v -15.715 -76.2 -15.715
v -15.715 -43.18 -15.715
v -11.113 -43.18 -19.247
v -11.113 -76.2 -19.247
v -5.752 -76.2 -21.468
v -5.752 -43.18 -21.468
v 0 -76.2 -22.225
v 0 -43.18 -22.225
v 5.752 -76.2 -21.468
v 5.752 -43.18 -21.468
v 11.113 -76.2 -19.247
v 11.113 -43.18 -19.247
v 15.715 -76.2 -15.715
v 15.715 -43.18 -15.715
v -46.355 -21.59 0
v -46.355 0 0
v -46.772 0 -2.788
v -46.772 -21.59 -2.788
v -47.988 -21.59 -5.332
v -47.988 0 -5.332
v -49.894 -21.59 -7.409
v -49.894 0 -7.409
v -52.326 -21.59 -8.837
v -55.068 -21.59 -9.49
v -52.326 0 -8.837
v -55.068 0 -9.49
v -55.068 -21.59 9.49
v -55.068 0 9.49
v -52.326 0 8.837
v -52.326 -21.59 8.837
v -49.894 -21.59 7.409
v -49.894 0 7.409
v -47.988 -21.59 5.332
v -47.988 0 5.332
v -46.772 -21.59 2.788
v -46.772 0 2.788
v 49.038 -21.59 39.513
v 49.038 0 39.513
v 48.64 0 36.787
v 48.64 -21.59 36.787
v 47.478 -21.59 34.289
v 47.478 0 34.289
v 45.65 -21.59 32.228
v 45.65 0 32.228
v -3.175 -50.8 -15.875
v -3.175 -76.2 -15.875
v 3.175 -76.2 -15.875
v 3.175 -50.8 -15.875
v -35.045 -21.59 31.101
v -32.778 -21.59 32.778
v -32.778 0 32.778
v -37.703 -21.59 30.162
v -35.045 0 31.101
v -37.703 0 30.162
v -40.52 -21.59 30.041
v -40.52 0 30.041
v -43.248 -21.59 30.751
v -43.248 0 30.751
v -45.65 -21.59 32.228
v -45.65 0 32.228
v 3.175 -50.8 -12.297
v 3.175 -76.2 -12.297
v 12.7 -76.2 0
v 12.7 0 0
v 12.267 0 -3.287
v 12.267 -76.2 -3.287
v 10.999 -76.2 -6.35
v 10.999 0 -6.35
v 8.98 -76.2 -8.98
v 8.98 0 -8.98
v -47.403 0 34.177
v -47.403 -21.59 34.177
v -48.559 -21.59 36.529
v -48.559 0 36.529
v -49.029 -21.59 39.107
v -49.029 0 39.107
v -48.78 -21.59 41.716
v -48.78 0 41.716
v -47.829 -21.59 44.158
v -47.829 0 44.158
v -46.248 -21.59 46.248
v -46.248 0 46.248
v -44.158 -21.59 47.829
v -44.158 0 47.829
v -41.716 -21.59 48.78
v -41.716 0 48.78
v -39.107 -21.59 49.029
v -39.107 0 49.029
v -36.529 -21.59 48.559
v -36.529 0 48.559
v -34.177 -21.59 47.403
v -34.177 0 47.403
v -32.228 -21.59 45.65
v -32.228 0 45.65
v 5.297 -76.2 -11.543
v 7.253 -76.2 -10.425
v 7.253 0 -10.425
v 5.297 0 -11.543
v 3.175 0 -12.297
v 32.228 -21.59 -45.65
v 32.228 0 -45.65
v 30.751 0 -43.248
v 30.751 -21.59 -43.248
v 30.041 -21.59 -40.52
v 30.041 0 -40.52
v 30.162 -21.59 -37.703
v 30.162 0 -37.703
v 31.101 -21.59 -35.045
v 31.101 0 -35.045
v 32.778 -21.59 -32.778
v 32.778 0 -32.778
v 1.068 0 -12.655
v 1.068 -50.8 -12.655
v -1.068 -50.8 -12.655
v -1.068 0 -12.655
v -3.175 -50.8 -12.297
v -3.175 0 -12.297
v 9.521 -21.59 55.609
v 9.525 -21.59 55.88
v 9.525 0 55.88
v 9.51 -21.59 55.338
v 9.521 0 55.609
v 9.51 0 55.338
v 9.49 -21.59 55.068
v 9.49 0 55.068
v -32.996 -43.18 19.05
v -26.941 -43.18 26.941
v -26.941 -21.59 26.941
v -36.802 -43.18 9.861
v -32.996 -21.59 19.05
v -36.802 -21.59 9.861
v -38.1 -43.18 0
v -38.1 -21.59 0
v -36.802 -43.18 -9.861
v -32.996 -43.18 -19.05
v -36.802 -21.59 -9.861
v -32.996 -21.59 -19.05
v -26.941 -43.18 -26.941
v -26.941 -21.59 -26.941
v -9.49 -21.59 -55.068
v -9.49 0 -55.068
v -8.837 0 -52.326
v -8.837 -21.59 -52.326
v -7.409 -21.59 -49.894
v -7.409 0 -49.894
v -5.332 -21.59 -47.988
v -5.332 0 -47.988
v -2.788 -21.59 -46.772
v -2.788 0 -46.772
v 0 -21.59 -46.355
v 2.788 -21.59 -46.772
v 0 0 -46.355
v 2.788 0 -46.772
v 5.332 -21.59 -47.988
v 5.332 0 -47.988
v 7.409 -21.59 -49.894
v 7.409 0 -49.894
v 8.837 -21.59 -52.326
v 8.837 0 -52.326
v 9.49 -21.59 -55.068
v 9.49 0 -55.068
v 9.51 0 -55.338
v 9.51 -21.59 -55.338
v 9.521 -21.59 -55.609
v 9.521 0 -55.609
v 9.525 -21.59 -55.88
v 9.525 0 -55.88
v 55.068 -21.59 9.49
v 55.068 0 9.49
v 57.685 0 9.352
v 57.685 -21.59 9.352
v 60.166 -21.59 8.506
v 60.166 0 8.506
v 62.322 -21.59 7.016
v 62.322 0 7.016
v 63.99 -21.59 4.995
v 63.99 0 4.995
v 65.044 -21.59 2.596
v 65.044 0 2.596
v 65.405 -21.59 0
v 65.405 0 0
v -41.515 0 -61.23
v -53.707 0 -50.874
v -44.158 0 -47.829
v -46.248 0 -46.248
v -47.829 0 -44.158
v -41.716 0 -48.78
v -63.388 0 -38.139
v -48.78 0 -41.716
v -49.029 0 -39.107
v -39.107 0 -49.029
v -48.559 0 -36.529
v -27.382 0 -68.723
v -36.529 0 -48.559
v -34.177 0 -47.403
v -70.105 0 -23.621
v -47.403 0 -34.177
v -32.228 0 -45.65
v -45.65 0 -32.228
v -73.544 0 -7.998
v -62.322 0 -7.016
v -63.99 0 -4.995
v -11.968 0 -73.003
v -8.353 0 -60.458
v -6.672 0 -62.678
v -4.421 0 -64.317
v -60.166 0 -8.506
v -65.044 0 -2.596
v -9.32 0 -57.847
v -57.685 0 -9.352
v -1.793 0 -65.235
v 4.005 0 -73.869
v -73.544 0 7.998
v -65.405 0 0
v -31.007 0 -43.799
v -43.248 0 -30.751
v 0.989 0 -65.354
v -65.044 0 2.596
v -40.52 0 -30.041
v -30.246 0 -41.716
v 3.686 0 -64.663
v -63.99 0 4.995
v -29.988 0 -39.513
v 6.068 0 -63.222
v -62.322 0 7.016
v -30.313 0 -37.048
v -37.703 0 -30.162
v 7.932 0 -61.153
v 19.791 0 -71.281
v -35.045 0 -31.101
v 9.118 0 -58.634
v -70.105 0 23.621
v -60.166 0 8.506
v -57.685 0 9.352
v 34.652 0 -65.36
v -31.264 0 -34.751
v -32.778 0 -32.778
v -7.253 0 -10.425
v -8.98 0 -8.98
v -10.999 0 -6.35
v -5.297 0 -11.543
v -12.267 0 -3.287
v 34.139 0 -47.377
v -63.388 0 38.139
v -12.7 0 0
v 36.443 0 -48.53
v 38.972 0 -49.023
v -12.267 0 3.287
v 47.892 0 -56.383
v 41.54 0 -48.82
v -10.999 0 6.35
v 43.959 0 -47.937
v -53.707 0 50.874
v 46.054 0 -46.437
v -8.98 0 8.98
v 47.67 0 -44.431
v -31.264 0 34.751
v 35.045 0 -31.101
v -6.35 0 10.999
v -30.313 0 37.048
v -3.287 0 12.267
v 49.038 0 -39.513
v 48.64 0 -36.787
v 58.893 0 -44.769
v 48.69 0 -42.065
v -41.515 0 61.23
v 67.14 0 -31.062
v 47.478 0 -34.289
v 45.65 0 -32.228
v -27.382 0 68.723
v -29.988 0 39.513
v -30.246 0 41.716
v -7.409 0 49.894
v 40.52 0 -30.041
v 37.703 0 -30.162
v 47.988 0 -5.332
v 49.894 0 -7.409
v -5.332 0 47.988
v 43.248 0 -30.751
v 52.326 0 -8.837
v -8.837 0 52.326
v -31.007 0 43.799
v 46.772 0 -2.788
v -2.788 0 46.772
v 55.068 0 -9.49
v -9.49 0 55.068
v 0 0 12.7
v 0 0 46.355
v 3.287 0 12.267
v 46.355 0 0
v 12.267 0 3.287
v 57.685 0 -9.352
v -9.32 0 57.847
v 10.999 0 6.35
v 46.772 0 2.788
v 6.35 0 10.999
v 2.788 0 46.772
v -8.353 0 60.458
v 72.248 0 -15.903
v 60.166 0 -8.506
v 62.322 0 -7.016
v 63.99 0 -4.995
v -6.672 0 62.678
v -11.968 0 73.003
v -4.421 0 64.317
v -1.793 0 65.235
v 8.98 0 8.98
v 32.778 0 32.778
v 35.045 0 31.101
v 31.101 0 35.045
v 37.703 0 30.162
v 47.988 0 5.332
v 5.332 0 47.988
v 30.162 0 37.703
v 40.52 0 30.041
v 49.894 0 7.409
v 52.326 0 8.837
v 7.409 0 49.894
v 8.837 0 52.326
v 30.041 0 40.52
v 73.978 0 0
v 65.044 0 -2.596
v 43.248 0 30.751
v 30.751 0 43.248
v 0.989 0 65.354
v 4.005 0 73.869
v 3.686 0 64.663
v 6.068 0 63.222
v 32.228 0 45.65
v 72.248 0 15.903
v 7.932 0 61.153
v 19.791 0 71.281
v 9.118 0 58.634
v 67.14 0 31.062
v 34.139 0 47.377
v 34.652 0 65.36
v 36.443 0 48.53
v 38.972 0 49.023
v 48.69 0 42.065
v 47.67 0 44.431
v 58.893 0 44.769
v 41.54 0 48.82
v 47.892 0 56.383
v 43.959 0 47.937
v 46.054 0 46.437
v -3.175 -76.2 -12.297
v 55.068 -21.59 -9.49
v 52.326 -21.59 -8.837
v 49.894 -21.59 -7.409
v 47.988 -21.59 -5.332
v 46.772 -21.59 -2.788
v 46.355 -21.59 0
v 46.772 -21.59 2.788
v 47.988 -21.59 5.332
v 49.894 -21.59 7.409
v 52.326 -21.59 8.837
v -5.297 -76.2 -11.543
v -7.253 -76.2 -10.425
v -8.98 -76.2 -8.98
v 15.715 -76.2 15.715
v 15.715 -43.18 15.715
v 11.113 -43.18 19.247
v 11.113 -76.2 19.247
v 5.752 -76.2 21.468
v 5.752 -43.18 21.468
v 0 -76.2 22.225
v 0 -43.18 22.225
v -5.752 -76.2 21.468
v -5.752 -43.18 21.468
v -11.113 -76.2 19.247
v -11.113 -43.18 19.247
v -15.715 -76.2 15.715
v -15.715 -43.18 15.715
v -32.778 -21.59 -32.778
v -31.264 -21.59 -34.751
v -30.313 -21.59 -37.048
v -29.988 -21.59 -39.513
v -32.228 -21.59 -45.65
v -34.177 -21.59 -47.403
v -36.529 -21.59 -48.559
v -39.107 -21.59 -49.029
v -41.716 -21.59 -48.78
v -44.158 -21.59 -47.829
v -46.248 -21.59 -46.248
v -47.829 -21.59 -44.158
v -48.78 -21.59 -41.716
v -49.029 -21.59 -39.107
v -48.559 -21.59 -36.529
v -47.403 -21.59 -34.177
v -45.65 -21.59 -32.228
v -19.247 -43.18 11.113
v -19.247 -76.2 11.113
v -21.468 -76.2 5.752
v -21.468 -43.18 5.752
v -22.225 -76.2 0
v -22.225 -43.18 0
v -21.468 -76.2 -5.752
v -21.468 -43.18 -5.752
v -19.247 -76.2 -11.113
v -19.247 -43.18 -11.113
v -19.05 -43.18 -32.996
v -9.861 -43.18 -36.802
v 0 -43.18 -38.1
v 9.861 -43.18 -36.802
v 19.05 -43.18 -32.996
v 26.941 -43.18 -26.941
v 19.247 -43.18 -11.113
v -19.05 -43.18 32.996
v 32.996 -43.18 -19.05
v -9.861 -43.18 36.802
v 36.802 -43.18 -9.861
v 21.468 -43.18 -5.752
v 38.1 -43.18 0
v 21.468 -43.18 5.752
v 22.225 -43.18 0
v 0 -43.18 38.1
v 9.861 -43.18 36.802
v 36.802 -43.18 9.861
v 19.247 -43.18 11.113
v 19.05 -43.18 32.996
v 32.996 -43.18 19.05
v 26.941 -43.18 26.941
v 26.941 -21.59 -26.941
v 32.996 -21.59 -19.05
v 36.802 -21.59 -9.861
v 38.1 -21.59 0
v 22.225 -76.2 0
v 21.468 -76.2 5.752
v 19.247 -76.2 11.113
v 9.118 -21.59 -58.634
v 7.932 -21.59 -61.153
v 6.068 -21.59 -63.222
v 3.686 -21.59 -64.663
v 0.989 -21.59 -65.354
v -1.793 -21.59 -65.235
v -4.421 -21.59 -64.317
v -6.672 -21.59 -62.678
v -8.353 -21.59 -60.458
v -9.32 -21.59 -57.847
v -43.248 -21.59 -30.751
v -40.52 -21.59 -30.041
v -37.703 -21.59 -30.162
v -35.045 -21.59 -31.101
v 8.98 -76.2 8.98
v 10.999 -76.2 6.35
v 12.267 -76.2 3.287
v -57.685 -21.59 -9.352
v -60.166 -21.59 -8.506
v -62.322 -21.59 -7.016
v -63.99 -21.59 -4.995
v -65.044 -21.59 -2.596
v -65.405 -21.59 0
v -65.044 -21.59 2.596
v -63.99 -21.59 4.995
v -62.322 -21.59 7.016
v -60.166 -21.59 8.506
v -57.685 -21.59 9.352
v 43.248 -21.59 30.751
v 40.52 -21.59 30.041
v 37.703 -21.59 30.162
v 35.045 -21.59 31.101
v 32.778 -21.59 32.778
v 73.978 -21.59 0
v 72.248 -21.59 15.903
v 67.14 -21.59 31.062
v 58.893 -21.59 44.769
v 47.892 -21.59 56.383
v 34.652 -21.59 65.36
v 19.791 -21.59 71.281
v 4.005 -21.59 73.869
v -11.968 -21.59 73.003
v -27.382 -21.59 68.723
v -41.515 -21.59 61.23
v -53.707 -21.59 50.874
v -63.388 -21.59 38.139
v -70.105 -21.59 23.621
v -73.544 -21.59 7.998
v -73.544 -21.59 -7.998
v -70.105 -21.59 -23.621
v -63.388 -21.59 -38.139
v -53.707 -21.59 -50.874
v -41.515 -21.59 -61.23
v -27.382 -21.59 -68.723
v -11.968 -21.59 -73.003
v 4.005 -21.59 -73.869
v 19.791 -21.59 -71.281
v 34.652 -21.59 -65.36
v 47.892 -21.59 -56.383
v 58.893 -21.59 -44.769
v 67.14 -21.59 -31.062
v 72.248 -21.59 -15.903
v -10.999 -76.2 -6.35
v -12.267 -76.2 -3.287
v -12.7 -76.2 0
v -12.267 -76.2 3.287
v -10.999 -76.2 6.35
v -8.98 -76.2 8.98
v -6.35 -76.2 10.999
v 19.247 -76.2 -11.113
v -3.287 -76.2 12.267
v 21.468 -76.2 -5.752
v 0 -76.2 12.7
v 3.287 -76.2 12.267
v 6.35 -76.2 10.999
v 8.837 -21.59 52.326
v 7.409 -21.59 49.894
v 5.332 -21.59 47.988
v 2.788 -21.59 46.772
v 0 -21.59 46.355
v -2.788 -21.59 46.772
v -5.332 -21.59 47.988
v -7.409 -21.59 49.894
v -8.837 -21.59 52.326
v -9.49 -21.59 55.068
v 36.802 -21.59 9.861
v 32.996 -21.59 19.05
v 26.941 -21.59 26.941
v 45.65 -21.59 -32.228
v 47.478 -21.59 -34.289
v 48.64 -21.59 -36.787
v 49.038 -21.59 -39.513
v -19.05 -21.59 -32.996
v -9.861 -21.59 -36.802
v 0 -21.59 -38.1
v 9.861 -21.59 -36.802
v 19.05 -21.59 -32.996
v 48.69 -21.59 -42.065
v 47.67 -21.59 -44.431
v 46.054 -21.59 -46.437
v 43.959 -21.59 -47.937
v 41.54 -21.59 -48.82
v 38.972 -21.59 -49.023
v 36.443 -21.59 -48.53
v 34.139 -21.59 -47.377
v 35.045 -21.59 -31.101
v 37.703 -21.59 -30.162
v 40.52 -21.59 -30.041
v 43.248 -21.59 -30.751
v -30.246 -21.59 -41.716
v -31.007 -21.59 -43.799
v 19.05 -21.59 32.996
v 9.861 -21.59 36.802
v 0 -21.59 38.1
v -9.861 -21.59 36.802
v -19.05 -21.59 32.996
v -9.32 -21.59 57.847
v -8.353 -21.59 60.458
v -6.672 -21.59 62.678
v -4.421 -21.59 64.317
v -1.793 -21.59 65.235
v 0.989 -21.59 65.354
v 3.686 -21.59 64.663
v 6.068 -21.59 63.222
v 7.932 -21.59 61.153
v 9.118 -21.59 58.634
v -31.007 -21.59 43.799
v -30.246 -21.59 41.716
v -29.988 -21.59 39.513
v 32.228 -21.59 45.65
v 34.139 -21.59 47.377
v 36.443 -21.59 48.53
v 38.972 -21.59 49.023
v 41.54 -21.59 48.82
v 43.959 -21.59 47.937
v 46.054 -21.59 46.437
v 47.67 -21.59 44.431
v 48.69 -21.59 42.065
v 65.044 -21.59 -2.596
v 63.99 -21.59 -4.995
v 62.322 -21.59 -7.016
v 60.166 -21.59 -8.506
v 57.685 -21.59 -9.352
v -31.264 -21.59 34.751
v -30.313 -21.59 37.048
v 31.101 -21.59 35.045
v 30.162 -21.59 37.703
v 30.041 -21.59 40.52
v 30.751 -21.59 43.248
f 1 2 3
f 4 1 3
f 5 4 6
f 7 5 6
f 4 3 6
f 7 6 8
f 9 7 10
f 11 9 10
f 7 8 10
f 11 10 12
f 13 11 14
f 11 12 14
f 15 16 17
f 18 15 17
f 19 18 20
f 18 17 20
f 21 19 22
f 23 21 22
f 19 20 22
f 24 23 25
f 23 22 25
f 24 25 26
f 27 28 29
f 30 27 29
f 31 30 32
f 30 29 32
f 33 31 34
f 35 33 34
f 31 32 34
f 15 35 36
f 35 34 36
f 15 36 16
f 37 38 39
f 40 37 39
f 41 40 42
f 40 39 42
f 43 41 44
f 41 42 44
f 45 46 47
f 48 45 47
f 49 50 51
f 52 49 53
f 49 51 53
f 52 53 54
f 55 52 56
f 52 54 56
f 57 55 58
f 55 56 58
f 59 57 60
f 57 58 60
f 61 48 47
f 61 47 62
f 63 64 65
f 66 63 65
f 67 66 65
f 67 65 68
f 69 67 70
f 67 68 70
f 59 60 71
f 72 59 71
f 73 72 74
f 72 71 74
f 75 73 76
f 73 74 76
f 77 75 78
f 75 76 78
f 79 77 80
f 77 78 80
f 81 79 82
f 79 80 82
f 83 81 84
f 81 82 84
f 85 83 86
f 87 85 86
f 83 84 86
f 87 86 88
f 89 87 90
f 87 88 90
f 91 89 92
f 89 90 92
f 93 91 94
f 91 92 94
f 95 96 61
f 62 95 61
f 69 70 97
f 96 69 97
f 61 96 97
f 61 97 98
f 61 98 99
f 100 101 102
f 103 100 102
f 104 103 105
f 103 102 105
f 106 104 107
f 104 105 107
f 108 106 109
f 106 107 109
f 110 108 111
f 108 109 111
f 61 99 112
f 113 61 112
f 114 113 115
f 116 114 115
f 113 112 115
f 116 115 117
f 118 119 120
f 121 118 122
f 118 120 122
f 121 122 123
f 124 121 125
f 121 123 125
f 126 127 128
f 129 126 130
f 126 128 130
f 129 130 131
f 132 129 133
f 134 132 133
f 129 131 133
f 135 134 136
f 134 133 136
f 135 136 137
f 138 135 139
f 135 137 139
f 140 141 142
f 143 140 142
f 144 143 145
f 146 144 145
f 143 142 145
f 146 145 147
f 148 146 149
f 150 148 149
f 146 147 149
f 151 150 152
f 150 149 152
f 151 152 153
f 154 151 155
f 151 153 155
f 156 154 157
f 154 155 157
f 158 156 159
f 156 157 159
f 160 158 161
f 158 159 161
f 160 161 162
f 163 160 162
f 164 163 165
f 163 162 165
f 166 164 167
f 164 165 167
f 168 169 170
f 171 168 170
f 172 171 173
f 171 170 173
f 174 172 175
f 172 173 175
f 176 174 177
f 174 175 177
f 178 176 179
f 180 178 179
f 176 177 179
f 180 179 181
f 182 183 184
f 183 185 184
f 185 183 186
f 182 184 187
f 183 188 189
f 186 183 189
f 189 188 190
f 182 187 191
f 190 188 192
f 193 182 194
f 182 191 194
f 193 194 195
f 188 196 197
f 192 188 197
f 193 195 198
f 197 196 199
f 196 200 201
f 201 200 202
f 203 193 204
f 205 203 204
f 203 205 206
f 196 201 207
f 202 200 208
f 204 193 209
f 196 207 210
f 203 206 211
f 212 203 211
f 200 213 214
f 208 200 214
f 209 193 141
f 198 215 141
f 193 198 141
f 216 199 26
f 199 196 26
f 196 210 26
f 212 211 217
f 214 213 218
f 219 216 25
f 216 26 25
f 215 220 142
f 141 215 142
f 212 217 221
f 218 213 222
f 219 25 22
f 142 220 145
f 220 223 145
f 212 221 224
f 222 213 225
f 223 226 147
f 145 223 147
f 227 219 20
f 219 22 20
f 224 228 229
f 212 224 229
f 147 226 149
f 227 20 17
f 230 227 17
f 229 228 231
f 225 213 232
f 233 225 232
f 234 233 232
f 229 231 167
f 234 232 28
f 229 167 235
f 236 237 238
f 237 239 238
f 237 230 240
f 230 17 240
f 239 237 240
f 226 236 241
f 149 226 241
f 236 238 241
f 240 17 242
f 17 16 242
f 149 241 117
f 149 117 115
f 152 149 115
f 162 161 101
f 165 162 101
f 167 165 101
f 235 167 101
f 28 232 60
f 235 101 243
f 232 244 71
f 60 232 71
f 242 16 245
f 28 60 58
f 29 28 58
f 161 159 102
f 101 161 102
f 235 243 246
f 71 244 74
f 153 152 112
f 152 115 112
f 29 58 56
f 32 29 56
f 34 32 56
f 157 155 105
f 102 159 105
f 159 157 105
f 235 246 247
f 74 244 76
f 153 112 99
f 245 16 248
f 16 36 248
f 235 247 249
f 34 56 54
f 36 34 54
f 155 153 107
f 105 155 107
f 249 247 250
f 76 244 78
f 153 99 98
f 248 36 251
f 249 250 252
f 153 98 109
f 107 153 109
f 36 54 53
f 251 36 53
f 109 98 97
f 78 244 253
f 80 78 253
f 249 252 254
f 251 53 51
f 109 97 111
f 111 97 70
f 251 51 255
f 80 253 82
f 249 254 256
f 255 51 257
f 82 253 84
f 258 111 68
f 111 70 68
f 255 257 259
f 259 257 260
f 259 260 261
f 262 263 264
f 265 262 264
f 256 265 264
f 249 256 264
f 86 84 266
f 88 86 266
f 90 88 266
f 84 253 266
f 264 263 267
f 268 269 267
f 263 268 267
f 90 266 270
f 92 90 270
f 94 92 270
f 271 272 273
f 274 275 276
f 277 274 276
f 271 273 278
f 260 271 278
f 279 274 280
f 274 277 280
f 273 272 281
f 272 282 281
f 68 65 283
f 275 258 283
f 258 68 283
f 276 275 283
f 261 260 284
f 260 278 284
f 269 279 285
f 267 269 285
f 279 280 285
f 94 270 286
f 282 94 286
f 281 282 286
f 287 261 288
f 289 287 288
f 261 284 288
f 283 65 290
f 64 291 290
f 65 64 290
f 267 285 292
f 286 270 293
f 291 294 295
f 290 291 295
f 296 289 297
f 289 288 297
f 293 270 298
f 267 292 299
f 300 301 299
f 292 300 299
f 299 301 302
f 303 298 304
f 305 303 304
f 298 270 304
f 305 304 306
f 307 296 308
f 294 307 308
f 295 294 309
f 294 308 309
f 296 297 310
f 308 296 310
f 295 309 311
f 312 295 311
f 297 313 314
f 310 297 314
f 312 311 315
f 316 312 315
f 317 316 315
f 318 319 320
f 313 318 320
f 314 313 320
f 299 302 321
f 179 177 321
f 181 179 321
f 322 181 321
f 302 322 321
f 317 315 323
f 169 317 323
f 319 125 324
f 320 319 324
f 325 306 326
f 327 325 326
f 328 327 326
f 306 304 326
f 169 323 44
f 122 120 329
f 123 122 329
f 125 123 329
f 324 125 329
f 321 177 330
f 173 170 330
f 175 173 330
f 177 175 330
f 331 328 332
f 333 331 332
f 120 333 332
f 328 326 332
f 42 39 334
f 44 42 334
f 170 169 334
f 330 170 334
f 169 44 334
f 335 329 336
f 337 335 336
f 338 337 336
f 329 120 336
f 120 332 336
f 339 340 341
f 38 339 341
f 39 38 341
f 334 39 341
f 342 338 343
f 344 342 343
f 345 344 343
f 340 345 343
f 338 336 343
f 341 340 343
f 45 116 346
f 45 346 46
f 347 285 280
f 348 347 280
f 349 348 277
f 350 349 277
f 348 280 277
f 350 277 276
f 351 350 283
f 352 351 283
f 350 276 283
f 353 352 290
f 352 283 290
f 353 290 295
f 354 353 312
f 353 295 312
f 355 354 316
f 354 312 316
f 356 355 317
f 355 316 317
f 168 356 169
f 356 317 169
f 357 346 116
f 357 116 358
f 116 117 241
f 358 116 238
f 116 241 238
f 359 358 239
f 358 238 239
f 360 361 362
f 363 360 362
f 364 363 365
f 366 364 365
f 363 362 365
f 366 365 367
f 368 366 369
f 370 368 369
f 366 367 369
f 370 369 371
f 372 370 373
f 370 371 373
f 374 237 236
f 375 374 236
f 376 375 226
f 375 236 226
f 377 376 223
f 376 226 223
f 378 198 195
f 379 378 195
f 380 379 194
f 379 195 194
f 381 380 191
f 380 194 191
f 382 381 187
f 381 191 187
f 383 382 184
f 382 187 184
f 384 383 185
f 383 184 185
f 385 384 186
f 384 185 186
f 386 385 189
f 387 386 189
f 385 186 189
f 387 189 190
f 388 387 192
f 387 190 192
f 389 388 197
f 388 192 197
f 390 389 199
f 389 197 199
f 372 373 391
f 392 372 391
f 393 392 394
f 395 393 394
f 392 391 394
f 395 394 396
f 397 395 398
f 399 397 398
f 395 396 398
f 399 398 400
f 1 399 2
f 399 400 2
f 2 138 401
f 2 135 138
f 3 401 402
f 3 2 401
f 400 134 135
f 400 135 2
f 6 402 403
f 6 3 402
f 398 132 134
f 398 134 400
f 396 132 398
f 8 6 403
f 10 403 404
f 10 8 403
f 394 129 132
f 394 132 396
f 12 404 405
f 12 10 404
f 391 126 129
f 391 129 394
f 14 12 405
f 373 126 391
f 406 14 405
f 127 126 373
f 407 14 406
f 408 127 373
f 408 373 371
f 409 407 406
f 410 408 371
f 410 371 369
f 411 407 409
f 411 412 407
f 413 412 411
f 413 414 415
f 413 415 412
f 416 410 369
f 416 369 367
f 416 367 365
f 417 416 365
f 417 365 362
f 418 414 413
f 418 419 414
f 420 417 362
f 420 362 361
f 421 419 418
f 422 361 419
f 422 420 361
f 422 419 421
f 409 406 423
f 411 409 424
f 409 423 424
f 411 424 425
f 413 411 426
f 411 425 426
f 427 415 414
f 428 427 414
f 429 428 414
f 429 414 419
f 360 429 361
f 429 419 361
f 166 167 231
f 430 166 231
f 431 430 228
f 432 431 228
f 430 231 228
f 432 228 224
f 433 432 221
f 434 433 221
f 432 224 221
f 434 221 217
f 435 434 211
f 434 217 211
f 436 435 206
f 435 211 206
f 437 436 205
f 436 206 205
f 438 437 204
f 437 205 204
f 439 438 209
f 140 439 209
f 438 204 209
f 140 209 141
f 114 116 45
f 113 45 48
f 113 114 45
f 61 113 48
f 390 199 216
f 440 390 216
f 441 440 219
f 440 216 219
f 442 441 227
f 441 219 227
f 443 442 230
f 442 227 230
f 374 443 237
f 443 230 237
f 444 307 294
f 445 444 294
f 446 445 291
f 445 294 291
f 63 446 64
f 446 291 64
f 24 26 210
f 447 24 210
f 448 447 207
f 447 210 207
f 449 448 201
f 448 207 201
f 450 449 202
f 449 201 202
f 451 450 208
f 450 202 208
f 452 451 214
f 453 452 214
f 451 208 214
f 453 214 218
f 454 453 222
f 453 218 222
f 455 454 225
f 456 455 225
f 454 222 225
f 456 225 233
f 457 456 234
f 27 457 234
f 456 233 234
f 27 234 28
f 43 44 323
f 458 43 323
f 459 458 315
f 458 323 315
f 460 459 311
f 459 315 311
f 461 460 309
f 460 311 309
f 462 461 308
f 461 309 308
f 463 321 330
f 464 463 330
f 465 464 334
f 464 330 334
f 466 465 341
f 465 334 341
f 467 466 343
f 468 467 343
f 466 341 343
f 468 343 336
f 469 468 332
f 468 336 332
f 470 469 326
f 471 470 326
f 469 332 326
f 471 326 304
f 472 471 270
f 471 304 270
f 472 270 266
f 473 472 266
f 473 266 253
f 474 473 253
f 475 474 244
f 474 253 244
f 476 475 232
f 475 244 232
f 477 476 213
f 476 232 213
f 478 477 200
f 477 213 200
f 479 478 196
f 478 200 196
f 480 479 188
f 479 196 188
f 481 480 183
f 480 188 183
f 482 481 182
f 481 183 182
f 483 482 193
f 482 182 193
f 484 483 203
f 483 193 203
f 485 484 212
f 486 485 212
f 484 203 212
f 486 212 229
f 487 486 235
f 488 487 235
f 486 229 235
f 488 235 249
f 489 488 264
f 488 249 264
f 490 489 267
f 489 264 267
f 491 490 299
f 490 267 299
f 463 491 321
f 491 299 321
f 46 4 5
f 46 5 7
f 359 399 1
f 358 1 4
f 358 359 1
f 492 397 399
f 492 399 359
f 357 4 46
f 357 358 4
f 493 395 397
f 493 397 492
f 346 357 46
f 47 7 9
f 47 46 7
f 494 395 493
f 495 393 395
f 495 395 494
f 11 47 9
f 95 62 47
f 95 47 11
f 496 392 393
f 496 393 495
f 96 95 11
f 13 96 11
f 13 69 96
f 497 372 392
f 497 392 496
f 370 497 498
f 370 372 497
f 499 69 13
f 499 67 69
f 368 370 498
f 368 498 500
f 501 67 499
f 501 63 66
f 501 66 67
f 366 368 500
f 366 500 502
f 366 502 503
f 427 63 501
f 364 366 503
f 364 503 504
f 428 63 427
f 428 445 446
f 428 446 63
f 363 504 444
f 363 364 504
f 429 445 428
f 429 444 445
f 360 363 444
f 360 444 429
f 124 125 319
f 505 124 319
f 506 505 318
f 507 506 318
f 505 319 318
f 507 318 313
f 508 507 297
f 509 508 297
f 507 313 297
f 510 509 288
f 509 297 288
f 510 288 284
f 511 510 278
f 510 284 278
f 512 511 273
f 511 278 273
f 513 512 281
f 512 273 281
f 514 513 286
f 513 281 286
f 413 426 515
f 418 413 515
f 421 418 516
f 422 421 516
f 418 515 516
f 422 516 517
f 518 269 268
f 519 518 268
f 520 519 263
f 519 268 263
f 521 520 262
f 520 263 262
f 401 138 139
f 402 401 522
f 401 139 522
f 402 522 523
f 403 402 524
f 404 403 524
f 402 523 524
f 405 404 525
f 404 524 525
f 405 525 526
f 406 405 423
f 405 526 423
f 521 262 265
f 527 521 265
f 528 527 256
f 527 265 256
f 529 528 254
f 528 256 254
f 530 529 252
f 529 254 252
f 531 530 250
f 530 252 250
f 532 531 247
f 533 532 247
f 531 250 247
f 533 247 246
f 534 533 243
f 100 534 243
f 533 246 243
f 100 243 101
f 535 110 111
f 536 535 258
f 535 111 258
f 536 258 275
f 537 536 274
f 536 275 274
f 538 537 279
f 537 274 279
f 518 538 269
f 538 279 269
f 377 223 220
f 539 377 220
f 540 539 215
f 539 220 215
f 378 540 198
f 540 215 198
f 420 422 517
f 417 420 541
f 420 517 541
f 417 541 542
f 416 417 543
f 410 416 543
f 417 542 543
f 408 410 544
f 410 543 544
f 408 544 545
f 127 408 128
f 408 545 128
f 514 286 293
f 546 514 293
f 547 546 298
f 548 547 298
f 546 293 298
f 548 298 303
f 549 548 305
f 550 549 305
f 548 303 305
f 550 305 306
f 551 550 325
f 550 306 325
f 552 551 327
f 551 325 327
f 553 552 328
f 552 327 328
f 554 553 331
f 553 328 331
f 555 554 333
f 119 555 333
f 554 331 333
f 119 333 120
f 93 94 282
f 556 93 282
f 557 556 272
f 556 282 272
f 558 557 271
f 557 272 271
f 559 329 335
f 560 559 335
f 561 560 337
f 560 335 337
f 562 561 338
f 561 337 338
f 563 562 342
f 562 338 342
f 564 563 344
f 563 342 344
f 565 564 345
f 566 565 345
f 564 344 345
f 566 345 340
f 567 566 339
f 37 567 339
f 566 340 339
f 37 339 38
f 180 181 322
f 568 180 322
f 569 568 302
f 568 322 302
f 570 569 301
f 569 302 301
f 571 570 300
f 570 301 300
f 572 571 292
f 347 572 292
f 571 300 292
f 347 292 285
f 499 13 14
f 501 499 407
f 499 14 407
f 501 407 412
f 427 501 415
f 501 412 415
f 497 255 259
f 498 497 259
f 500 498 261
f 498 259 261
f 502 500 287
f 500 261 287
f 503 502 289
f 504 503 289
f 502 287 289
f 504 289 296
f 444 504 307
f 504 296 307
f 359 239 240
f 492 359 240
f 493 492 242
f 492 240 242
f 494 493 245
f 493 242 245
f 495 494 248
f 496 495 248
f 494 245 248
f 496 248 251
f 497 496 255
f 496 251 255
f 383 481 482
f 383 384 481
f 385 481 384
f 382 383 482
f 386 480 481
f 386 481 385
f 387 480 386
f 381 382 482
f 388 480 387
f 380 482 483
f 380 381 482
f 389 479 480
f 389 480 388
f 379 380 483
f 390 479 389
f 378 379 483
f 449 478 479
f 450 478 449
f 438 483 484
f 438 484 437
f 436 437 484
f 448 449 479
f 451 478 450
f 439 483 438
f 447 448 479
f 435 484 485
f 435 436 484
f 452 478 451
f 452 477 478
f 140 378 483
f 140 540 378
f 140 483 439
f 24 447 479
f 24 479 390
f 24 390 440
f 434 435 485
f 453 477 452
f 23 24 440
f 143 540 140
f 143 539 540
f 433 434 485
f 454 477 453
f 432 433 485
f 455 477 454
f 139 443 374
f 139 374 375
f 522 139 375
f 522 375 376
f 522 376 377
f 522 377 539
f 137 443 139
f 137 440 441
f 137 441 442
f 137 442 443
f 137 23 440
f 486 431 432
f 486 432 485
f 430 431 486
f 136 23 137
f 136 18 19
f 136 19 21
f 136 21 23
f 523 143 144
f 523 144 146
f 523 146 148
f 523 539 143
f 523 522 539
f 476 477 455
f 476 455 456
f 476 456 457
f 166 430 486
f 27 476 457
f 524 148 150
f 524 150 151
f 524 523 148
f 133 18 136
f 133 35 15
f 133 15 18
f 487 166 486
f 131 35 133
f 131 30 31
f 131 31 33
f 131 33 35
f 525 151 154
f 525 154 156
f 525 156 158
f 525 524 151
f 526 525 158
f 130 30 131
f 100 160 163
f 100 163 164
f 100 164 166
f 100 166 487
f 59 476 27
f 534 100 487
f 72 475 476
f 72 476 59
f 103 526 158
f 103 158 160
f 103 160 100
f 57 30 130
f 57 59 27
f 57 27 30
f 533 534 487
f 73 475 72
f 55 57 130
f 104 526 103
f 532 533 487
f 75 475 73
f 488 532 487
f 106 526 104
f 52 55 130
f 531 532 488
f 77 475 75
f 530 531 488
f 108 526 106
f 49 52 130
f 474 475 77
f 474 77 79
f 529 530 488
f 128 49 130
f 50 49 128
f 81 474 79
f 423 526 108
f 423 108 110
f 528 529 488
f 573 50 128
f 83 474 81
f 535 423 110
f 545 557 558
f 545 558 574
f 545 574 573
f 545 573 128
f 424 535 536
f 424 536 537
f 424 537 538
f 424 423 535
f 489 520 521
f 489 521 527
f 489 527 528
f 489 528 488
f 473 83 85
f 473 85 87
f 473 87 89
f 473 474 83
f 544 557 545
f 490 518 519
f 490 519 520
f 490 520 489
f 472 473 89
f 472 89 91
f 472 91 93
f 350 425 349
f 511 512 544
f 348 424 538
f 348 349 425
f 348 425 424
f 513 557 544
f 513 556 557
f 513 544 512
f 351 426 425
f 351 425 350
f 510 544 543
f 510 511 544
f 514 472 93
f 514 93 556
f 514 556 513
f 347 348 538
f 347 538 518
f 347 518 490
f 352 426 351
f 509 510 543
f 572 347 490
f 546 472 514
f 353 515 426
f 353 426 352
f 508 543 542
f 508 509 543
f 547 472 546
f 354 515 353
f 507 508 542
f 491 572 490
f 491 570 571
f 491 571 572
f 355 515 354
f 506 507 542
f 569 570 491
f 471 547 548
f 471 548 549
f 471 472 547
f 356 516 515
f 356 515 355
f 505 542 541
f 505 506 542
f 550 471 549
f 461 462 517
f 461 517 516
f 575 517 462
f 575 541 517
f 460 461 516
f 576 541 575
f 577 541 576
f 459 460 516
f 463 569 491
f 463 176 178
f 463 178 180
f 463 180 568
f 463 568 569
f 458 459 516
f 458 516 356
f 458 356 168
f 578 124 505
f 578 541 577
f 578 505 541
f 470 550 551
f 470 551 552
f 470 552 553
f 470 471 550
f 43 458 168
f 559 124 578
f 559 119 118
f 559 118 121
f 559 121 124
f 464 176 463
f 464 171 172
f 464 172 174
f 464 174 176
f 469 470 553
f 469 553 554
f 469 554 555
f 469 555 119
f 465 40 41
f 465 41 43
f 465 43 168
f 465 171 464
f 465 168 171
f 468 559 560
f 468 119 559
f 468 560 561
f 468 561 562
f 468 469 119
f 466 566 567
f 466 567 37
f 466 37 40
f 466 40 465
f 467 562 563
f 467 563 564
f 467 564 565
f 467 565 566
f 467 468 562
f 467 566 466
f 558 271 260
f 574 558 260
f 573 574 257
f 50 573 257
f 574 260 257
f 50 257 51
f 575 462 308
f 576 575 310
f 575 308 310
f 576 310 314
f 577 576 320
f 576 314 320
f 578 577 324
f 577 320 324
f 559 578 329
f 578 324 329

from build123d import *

# Parameters (mm, degrees)
F0_R     = 73.9775
F1_DEPTH = 21.59
F2_DEPTH = 21.59
F3_DEPTH = 43.18
F4_DEPTH = 76.2
F6_DEPTH = 25.4


with BuildPart() as f1:
    # F0 (on Front) → F1 (new body)
    with BuildSketch(Plane.XZ):
        Circle(F0_R)
        with BuildLine():
            ThreePointArc((9.4903436379, 55.0682102273), (21.3843502006, 51.6263882767), (32.2284185374, 45.6497912216))
            ThreePointArc((32.2284185374, 45.6497912216), (42.7795299647, 48.4605419914), (49.0381269327, 39.5131269327))
            ThreePointArc((49.0381269327, 39.5131269327), (48.1496005288, 35.4960448046), (45.6497912216, 32.2284185374))
            ThreePointArc((45.6497912216, 32.2284185374), (51.6263882767, 21.3843502006), (55.0682102273, 9.4903436379))
            ThreePointArc((55.0682102273, 9.4903436379), (62.3217904116, 7.0163353179), (65.405, 0))
            ThreePointArc((65.405, 0), (62.3217904116, -7.0163353179), (55.0682102273, -9.4903436379))
            ThreePointArc((55.0682102273, -9.4903436379), (51.6263882767, -21.3843502006), (45.6497912216, -32.2284185374))
            ThreePointArc((45.6497912216, -32.2284185374), (48.1496005288, -35.4960448046), (49.0381269327, -39.5131269327))
            ThreePointArc((49.0381269327, -39.5131269327), (42.7795299647, -48.4605419914), (32.2284185374, -45.6497912216))
            ThreePointArc((32.2284185374, -45.6497912216), (21.3843502006, -51.6263882767), (9.4903436379, -55.0682102273))
            ThreePointArc((9.4903436379, -55.0682102273), (9.5163319654, -55.4737354007), (9.525, -55.88))
            ThreePointArc((9.525, -55.88), (-0.4062645993, -65.3963319654), (-9.4903436379, -55.0682102273))
            ThreePointArc((-9.4903436379, -55.0682102273), (-21.3843502006, -51.6263882767), (-32.2284185374, -45.6497912216))
            ThreePointArc((-32.2284185374, -45.6497912216), (-46.2483190235, -46.2483190235), (-45.6497912216, -32.2284185374))
            ThreePointArc((-45.6497912216, -32.2284185374), (-51.6263882767, -21.3843502006), (-55.0682102273, -9.4903436379))
            ThreePointArc((-55.0682102273, -9.4903436379), (-65.405, 0), (-55.0682102273, 9.4903436379))
            ThreePointArc((-55.0682102273, 9.4903436379), (-51.6263882767, 21.3843502006), (-45.6497912216, 32.2284185374))
            ThreePointArc((-45.6497912216, 32.2284185374), (-46.2483190235, 46.2483190235), (-32.2284185374, 45.6497912216))
            ThreePointArc((-32.2284185374, 45.6497912216), (-21.3843502006, 51.6263882767), (-9.4903436379, 55.0682102273))
            ThreePointArc((-9.4903436379, 55.0682102273), (-0.4062645993, 65.3963319654), (9.525, 55.88))
            ThreePointArc((9.525, 55.88), (9.5163319654, 55.4737354007), (9.4903436379, 55.0682102273))
        make_face(mode=Mode.SUBTRACT)
    extrude(amount=F1_DEPTH)

    # F0 (on Front) → F2 (join)
    with BuildSketch(Plane.XZ):
        with BuildLine():
            ThreePointArc((-26.9407683632, -26.9407683632), (-38.1, 0), (-26.9407683632, 26.9407683632))
            Line((-26.9407683632, 26.9407683632), (-32.7779348419, 32.7779348419))
            ThreePointArc((-32.7779348419, 32.7779348419), (-39.1068623334, 29.9967949673), (-45.6497912216, 32.2284185374))
            ThreePointArc((-45.6497912216, 32.2284185374), (-51.6263882767, 21.3843502006), (-55.0682102273, 9.4903436379))
            ThreePointArc((-55.0682102273, 9.4903436379), (-48.8636646821, 6.4417904116), (-46.355, 0))
            ThreePointArc((-46.355, 0), (-48.8636646821, -6.4417904116), (-55.0682102273, -9.4903436379))
            ThreePointArc((-55.0682102273, -9.4903436379), (-51.6263882767, -21.3843502006), (-45.6497912216, -32.2284185374))
            ThreePointArc((-45.6497912216, -32.2284185374), (-39.1068623334, -29.9967949673), (-32.7779348419, -32.7779348419))
            Line((-32.7779348419, -32.7779348419), (-26.9407683632, -26.9407683632))
        make_face()
        with BuildLine():
            ThreePointArc((-26.9407683632, 26.9407683632), (0, 38.1), (26.9407683632, 26.9407683632))
            Line((26.9407683632, 26.9407683632), (32.7779348419, 32.7779348419))
            ThreePointArc((32.7779348419, 32.7779348419), (29.9967949673, 39.1068623334), (32.2284185374, 45.6497912216))
            ThreePointArc((32.2284185374, 45.6497912216), (21.3843502006, 51.6263882767), (9.4903436379, 55.0682102273))
            ThreePointArc((9.4903436379, 55.0682102273), (0, 46.355), (-9.4903436379, 55.0682102273))
            ThreePointArc((-9.4903436379, 55.0682102273), (-21.3843502006, 51.6263882767), (-32.2284185374, 45.6497912216))
            ThreePointArc((-32.2284185374, 45.6497912216), (-30.565711874, 42.7795299647), (-29.9881269327, 39.5131269327))
            ThreePointArc((-29.9881269327, 39.5131269327), (-30.7131743855, 35.8680672394), (-32.7779348419, 32.7779348419))
            Line((-32.7779348419, 32.7779348419), (-26.9407683632, 26.9407683632))
        make_face()
        with BuildLine():
            Line((32.7779348419, 32.7779348419), (26.9407683632, 26.9407683632))
            ThreePointArc((26.9407683632, 26.9407683632), (35.1998101887, 14.5802387731), (38.1, 0))
            ThreePointArc((38.1, 0), (35.1998101887, -14.5802387731), (26.9407683632, -26.9407683632))
            Line((26.9407683632, -26.9407683632), (32.7779348419, -32.7779348419))
            ThreePointArc((32.7779348419, -32.7779348419), (39.1068623334, -29.9967949673), (45.6497912216, -32.2284185374))
            ThreePointArc((45.6497912216, -32.2284185374), (51.6263882767, -21.3843502006), (55.0682102273, -9.4903436379))
            ThreePointArc((55.0682102273, -9.4903436379), (46.355, 0), (55.0682102273, 9.4903436379))
            ThreePointArc((55.0682102273, 9.4903436379), (51.6263882767, 21.3843502006), (45.6497912216, 32.2284185374))
            ThreePointArc((45.6497912216, 32.2284185374), (39.1068623334, 29.9967949673), (32.7779348419, 32.7779348419))
        make_face()
        with BuildLine():
            Line((32.7779348419, -32.7779348419), (26.9407683632, -26.9407683632))
            ThreePointArc((26.9407683632, -26.9407683632), (0, -38.1), (-26.9407683632, -26.9407683632))
            Line((-26.9407683632, -26.9407683632), (-32.7779348419, -32.7779348419))
            ThreePointArc((-32.7779348419, -32.7779348419), (-30.7131743855, -35.8680672394), (-29.9881269327, -39.5131269327))
            ThreePointArc((-29.9881269327, -39.5131269327), (-30.565711874, -42.7795299647), (-32.2284185374, -45.6497912216))
            ThreePointArc((-32.2284185374, -45.6497912216), (-21.3843502006, -51.6263882767), (-9.4903436379, -55.0682102273))
            ThreePointArc((-9.4903436379, -55.0682102273), (0, -46.355), (9.4903436379, -55.0682102273))
            ThreePointArc((9.4903436379, -55.0682102273), (21.3843502006, -51.6263882767), (32.2284185374, -45.6497912216))
            ThreePointArc((32.2284185374, -45.6497912216), (29.9967949673, -39.1068623334), (32.7779348419, -32.7779348419))
        make_face()
    extrude(amount=F2_DEPTH)

    # F0 (on Front) → F3 (join)
    with BuildSketch(Plane.XZ):
        with BuildLine():
            ThreePointArc((-15.7154482119, 15.7154482119), (0, 22.225), (15.7154482119, 15.7154482119))
            Line((15.7154482119, 15.7154482119), (26.9407683632, 26.9407683632))
            ThreePointArc((26.9407683632, 26.9407683632), (0, 38.1), (-26.9407683632, 26.9407683632))
            Line((-26.9407683632, 26.9407683632), (-15.7154482119, 15.7154482119))
        make_face()
        with BuildLine():
            Line((26.9407683632, 26.9407683632), (15.7154482119, 15.7154482119))
            ThreePointArc((15.7154482119, 15.7154482119), (20.5332226101, 8.5051392843), (22.225, 0))
            ThreePointArc((22.225, 0), (20.5332226101, -8.5051392843), (15.7154482119, -15.7154482119))
            Line((15.7154482119, -15.7154482119), (26.9407683632, -26.9407683632))
            ThreePointArc((26.9407683632, -26.9407683632), (35.1998101887, -14.5802387731), (38.1, 0))
            ThreePointArc((38.1, 0), (35.1998101887, 14.5802387731), (26.9407683632, 26.9407683632))
        make_face()
        with BuildLine():
            Line((26.9407683632, -26.9407683632), (15.7154482119, -15.7154482119))
            ThreePointArc((15.7154482119, -15.7154482119), (0, -22.225), (-15.7154482119, -15.7154482119))
            Line((-15.7154482119, -15.7154482119), (-26.9407683632, -26.9407683632))
            ThreePointArc((-26.9407683632, -26.9407683632), (0, -38.1), (26.9407683632, -26.9407683632))
        make_face()
        with BuildLine():
            ThreePointArc((-15.7154482119, -15.7154482119), (-22.225, 0), (-15.7154482119, 15.7154482119))
            Line((-15.7154482119, 15.7154482119), (-26.9407683632, 26.9407683632))
            ThreePointArc((-26.9407683632, 26.9407683632), (-38.1, 0), (-26.9407683632, -26.9407683632))
            Line((-26.9407683632, -26.9407683632), (-15.7154482119, -15.7154482119))
        make_face()
    extrude(amount=F3_DEPTH)

    # F0 (on Front) → F4 (join)
    with BuildSketch(Plane.XZ):
        with BuildLine():
            ThreePointArc((-8.9802561211, 8.9802561211), (0, 12.7), (8.9802561211, 8.9802561211))
            Line((8.9802561211, 8.9802561211), (15.7154482119, 15.7154482119))
            ThreePointArc((15.7154482119, 15.7154482119), (0, 22.225), (-15.7154482119, 15.7154482119))
            Line((-15.7154482119, 15.7154482119), (-8.9802561211, 8.9802561211))
        make_face()
        with BuildLine():
            ThreePointArc((8.9802561211, 8.9802561211), (11.7332700629, 4.860079591), (12.7, 0))
            ThreePointArc((12.7, 0), (11.7332700629, -4.860079591), (8.9802561211, -8.9802561211))
            Line((8.9802561211, -8.9802561211), (15.7154482119, -15.7154482119))
            ThreePointArc((15.7154482119, -15.7154482119), (20.5332226101, -8.5051392843), (22.225, 0))
            ThreePointArc((22.225, 0), (20.5332226101, 8.5051392843), (15.7154482119, 15.7154482119))
            Line((15.7154482119, 15.7154482119), (8.9802561211, 8.9802561211))
        make_face()
        with BuildLine():
            Line((15.7154482119, -15.7154482119), (8.9802561211, -8.9802561211))
            ThreePointArc((8.9802561211, -8.9802561211), (6.2997856733, -11.0273614464), (3.175, -12.2967221242))
            Line((3.175, -12.2967221242), (3.175, -15.875))
            Line((3.175, -15.875), (-3.175, -15.875))
            Line((-3.175, -15.875), (-3.175, -12.2967221242))
            ThreePointArc((-3.175, -12.2967221242), (-6.2997856733, -11.0273614464), (-8.9802561211, -8.9802561211))
            Line((-8.9802561211, -8.9802561211), (-15.7154482119, -15.7154482119))
            ThreePointArc((-15.7154482119, -15.7154482119), (0, -22.225), (15.7154482119, -15.7154482119))
        make_face()
        with BuildLine():
            ThreePointArc((-8.9802561211, -8.9802561211), (-12.7, 0), (-8.9802561211, 8.9802561211))
            Line((-8.9802561211, 8.9802561211), (-15.7154482119, 15.7154482119))
            ThreePointArc((-15.7154482119, 15.7154482119), (-22.225, 0), (-15.7154482119, -15.7154482119))
            Line((-15.7154482119, -15.7154482119), (-8.9802561211, -8.9802561211))
        make_face()
        with BuildLine():
            Line((3.175, -15.875), (3.175, -12.2967221242))
            ThreePointArc((3.175, -12.2967221242), (0, -12.7), (-3.175, -12.2967221242))
            Line((-3.175, -12.2967221242), (-3.175, -15.875))
            Line((-3.175, -15.875), (3.175, -15.875))
        make_face()
    extrude(amount=F4_DEPTH)

    # F5 (on face) → F6 (cut)
    with BuildSketch(Plane.XZ.offset(76.2)):
        with BuildLine():
            Line((-3.175, -15.875), (3.175, -15.875))
            Line((3.175, -15.875), (3.175, -12.2967221242))
            ThreePointArc((3.175, -12.2967221242), (0, -12.7), (-3.175, -12.2967221242))
            Line((-3.175, -12.2967221242), (-3.175, -15.875))
        make_face()
    extrude(amount=-F6_DEPTH, mode=Mode.SUBTRACT)


solid = f1.part
